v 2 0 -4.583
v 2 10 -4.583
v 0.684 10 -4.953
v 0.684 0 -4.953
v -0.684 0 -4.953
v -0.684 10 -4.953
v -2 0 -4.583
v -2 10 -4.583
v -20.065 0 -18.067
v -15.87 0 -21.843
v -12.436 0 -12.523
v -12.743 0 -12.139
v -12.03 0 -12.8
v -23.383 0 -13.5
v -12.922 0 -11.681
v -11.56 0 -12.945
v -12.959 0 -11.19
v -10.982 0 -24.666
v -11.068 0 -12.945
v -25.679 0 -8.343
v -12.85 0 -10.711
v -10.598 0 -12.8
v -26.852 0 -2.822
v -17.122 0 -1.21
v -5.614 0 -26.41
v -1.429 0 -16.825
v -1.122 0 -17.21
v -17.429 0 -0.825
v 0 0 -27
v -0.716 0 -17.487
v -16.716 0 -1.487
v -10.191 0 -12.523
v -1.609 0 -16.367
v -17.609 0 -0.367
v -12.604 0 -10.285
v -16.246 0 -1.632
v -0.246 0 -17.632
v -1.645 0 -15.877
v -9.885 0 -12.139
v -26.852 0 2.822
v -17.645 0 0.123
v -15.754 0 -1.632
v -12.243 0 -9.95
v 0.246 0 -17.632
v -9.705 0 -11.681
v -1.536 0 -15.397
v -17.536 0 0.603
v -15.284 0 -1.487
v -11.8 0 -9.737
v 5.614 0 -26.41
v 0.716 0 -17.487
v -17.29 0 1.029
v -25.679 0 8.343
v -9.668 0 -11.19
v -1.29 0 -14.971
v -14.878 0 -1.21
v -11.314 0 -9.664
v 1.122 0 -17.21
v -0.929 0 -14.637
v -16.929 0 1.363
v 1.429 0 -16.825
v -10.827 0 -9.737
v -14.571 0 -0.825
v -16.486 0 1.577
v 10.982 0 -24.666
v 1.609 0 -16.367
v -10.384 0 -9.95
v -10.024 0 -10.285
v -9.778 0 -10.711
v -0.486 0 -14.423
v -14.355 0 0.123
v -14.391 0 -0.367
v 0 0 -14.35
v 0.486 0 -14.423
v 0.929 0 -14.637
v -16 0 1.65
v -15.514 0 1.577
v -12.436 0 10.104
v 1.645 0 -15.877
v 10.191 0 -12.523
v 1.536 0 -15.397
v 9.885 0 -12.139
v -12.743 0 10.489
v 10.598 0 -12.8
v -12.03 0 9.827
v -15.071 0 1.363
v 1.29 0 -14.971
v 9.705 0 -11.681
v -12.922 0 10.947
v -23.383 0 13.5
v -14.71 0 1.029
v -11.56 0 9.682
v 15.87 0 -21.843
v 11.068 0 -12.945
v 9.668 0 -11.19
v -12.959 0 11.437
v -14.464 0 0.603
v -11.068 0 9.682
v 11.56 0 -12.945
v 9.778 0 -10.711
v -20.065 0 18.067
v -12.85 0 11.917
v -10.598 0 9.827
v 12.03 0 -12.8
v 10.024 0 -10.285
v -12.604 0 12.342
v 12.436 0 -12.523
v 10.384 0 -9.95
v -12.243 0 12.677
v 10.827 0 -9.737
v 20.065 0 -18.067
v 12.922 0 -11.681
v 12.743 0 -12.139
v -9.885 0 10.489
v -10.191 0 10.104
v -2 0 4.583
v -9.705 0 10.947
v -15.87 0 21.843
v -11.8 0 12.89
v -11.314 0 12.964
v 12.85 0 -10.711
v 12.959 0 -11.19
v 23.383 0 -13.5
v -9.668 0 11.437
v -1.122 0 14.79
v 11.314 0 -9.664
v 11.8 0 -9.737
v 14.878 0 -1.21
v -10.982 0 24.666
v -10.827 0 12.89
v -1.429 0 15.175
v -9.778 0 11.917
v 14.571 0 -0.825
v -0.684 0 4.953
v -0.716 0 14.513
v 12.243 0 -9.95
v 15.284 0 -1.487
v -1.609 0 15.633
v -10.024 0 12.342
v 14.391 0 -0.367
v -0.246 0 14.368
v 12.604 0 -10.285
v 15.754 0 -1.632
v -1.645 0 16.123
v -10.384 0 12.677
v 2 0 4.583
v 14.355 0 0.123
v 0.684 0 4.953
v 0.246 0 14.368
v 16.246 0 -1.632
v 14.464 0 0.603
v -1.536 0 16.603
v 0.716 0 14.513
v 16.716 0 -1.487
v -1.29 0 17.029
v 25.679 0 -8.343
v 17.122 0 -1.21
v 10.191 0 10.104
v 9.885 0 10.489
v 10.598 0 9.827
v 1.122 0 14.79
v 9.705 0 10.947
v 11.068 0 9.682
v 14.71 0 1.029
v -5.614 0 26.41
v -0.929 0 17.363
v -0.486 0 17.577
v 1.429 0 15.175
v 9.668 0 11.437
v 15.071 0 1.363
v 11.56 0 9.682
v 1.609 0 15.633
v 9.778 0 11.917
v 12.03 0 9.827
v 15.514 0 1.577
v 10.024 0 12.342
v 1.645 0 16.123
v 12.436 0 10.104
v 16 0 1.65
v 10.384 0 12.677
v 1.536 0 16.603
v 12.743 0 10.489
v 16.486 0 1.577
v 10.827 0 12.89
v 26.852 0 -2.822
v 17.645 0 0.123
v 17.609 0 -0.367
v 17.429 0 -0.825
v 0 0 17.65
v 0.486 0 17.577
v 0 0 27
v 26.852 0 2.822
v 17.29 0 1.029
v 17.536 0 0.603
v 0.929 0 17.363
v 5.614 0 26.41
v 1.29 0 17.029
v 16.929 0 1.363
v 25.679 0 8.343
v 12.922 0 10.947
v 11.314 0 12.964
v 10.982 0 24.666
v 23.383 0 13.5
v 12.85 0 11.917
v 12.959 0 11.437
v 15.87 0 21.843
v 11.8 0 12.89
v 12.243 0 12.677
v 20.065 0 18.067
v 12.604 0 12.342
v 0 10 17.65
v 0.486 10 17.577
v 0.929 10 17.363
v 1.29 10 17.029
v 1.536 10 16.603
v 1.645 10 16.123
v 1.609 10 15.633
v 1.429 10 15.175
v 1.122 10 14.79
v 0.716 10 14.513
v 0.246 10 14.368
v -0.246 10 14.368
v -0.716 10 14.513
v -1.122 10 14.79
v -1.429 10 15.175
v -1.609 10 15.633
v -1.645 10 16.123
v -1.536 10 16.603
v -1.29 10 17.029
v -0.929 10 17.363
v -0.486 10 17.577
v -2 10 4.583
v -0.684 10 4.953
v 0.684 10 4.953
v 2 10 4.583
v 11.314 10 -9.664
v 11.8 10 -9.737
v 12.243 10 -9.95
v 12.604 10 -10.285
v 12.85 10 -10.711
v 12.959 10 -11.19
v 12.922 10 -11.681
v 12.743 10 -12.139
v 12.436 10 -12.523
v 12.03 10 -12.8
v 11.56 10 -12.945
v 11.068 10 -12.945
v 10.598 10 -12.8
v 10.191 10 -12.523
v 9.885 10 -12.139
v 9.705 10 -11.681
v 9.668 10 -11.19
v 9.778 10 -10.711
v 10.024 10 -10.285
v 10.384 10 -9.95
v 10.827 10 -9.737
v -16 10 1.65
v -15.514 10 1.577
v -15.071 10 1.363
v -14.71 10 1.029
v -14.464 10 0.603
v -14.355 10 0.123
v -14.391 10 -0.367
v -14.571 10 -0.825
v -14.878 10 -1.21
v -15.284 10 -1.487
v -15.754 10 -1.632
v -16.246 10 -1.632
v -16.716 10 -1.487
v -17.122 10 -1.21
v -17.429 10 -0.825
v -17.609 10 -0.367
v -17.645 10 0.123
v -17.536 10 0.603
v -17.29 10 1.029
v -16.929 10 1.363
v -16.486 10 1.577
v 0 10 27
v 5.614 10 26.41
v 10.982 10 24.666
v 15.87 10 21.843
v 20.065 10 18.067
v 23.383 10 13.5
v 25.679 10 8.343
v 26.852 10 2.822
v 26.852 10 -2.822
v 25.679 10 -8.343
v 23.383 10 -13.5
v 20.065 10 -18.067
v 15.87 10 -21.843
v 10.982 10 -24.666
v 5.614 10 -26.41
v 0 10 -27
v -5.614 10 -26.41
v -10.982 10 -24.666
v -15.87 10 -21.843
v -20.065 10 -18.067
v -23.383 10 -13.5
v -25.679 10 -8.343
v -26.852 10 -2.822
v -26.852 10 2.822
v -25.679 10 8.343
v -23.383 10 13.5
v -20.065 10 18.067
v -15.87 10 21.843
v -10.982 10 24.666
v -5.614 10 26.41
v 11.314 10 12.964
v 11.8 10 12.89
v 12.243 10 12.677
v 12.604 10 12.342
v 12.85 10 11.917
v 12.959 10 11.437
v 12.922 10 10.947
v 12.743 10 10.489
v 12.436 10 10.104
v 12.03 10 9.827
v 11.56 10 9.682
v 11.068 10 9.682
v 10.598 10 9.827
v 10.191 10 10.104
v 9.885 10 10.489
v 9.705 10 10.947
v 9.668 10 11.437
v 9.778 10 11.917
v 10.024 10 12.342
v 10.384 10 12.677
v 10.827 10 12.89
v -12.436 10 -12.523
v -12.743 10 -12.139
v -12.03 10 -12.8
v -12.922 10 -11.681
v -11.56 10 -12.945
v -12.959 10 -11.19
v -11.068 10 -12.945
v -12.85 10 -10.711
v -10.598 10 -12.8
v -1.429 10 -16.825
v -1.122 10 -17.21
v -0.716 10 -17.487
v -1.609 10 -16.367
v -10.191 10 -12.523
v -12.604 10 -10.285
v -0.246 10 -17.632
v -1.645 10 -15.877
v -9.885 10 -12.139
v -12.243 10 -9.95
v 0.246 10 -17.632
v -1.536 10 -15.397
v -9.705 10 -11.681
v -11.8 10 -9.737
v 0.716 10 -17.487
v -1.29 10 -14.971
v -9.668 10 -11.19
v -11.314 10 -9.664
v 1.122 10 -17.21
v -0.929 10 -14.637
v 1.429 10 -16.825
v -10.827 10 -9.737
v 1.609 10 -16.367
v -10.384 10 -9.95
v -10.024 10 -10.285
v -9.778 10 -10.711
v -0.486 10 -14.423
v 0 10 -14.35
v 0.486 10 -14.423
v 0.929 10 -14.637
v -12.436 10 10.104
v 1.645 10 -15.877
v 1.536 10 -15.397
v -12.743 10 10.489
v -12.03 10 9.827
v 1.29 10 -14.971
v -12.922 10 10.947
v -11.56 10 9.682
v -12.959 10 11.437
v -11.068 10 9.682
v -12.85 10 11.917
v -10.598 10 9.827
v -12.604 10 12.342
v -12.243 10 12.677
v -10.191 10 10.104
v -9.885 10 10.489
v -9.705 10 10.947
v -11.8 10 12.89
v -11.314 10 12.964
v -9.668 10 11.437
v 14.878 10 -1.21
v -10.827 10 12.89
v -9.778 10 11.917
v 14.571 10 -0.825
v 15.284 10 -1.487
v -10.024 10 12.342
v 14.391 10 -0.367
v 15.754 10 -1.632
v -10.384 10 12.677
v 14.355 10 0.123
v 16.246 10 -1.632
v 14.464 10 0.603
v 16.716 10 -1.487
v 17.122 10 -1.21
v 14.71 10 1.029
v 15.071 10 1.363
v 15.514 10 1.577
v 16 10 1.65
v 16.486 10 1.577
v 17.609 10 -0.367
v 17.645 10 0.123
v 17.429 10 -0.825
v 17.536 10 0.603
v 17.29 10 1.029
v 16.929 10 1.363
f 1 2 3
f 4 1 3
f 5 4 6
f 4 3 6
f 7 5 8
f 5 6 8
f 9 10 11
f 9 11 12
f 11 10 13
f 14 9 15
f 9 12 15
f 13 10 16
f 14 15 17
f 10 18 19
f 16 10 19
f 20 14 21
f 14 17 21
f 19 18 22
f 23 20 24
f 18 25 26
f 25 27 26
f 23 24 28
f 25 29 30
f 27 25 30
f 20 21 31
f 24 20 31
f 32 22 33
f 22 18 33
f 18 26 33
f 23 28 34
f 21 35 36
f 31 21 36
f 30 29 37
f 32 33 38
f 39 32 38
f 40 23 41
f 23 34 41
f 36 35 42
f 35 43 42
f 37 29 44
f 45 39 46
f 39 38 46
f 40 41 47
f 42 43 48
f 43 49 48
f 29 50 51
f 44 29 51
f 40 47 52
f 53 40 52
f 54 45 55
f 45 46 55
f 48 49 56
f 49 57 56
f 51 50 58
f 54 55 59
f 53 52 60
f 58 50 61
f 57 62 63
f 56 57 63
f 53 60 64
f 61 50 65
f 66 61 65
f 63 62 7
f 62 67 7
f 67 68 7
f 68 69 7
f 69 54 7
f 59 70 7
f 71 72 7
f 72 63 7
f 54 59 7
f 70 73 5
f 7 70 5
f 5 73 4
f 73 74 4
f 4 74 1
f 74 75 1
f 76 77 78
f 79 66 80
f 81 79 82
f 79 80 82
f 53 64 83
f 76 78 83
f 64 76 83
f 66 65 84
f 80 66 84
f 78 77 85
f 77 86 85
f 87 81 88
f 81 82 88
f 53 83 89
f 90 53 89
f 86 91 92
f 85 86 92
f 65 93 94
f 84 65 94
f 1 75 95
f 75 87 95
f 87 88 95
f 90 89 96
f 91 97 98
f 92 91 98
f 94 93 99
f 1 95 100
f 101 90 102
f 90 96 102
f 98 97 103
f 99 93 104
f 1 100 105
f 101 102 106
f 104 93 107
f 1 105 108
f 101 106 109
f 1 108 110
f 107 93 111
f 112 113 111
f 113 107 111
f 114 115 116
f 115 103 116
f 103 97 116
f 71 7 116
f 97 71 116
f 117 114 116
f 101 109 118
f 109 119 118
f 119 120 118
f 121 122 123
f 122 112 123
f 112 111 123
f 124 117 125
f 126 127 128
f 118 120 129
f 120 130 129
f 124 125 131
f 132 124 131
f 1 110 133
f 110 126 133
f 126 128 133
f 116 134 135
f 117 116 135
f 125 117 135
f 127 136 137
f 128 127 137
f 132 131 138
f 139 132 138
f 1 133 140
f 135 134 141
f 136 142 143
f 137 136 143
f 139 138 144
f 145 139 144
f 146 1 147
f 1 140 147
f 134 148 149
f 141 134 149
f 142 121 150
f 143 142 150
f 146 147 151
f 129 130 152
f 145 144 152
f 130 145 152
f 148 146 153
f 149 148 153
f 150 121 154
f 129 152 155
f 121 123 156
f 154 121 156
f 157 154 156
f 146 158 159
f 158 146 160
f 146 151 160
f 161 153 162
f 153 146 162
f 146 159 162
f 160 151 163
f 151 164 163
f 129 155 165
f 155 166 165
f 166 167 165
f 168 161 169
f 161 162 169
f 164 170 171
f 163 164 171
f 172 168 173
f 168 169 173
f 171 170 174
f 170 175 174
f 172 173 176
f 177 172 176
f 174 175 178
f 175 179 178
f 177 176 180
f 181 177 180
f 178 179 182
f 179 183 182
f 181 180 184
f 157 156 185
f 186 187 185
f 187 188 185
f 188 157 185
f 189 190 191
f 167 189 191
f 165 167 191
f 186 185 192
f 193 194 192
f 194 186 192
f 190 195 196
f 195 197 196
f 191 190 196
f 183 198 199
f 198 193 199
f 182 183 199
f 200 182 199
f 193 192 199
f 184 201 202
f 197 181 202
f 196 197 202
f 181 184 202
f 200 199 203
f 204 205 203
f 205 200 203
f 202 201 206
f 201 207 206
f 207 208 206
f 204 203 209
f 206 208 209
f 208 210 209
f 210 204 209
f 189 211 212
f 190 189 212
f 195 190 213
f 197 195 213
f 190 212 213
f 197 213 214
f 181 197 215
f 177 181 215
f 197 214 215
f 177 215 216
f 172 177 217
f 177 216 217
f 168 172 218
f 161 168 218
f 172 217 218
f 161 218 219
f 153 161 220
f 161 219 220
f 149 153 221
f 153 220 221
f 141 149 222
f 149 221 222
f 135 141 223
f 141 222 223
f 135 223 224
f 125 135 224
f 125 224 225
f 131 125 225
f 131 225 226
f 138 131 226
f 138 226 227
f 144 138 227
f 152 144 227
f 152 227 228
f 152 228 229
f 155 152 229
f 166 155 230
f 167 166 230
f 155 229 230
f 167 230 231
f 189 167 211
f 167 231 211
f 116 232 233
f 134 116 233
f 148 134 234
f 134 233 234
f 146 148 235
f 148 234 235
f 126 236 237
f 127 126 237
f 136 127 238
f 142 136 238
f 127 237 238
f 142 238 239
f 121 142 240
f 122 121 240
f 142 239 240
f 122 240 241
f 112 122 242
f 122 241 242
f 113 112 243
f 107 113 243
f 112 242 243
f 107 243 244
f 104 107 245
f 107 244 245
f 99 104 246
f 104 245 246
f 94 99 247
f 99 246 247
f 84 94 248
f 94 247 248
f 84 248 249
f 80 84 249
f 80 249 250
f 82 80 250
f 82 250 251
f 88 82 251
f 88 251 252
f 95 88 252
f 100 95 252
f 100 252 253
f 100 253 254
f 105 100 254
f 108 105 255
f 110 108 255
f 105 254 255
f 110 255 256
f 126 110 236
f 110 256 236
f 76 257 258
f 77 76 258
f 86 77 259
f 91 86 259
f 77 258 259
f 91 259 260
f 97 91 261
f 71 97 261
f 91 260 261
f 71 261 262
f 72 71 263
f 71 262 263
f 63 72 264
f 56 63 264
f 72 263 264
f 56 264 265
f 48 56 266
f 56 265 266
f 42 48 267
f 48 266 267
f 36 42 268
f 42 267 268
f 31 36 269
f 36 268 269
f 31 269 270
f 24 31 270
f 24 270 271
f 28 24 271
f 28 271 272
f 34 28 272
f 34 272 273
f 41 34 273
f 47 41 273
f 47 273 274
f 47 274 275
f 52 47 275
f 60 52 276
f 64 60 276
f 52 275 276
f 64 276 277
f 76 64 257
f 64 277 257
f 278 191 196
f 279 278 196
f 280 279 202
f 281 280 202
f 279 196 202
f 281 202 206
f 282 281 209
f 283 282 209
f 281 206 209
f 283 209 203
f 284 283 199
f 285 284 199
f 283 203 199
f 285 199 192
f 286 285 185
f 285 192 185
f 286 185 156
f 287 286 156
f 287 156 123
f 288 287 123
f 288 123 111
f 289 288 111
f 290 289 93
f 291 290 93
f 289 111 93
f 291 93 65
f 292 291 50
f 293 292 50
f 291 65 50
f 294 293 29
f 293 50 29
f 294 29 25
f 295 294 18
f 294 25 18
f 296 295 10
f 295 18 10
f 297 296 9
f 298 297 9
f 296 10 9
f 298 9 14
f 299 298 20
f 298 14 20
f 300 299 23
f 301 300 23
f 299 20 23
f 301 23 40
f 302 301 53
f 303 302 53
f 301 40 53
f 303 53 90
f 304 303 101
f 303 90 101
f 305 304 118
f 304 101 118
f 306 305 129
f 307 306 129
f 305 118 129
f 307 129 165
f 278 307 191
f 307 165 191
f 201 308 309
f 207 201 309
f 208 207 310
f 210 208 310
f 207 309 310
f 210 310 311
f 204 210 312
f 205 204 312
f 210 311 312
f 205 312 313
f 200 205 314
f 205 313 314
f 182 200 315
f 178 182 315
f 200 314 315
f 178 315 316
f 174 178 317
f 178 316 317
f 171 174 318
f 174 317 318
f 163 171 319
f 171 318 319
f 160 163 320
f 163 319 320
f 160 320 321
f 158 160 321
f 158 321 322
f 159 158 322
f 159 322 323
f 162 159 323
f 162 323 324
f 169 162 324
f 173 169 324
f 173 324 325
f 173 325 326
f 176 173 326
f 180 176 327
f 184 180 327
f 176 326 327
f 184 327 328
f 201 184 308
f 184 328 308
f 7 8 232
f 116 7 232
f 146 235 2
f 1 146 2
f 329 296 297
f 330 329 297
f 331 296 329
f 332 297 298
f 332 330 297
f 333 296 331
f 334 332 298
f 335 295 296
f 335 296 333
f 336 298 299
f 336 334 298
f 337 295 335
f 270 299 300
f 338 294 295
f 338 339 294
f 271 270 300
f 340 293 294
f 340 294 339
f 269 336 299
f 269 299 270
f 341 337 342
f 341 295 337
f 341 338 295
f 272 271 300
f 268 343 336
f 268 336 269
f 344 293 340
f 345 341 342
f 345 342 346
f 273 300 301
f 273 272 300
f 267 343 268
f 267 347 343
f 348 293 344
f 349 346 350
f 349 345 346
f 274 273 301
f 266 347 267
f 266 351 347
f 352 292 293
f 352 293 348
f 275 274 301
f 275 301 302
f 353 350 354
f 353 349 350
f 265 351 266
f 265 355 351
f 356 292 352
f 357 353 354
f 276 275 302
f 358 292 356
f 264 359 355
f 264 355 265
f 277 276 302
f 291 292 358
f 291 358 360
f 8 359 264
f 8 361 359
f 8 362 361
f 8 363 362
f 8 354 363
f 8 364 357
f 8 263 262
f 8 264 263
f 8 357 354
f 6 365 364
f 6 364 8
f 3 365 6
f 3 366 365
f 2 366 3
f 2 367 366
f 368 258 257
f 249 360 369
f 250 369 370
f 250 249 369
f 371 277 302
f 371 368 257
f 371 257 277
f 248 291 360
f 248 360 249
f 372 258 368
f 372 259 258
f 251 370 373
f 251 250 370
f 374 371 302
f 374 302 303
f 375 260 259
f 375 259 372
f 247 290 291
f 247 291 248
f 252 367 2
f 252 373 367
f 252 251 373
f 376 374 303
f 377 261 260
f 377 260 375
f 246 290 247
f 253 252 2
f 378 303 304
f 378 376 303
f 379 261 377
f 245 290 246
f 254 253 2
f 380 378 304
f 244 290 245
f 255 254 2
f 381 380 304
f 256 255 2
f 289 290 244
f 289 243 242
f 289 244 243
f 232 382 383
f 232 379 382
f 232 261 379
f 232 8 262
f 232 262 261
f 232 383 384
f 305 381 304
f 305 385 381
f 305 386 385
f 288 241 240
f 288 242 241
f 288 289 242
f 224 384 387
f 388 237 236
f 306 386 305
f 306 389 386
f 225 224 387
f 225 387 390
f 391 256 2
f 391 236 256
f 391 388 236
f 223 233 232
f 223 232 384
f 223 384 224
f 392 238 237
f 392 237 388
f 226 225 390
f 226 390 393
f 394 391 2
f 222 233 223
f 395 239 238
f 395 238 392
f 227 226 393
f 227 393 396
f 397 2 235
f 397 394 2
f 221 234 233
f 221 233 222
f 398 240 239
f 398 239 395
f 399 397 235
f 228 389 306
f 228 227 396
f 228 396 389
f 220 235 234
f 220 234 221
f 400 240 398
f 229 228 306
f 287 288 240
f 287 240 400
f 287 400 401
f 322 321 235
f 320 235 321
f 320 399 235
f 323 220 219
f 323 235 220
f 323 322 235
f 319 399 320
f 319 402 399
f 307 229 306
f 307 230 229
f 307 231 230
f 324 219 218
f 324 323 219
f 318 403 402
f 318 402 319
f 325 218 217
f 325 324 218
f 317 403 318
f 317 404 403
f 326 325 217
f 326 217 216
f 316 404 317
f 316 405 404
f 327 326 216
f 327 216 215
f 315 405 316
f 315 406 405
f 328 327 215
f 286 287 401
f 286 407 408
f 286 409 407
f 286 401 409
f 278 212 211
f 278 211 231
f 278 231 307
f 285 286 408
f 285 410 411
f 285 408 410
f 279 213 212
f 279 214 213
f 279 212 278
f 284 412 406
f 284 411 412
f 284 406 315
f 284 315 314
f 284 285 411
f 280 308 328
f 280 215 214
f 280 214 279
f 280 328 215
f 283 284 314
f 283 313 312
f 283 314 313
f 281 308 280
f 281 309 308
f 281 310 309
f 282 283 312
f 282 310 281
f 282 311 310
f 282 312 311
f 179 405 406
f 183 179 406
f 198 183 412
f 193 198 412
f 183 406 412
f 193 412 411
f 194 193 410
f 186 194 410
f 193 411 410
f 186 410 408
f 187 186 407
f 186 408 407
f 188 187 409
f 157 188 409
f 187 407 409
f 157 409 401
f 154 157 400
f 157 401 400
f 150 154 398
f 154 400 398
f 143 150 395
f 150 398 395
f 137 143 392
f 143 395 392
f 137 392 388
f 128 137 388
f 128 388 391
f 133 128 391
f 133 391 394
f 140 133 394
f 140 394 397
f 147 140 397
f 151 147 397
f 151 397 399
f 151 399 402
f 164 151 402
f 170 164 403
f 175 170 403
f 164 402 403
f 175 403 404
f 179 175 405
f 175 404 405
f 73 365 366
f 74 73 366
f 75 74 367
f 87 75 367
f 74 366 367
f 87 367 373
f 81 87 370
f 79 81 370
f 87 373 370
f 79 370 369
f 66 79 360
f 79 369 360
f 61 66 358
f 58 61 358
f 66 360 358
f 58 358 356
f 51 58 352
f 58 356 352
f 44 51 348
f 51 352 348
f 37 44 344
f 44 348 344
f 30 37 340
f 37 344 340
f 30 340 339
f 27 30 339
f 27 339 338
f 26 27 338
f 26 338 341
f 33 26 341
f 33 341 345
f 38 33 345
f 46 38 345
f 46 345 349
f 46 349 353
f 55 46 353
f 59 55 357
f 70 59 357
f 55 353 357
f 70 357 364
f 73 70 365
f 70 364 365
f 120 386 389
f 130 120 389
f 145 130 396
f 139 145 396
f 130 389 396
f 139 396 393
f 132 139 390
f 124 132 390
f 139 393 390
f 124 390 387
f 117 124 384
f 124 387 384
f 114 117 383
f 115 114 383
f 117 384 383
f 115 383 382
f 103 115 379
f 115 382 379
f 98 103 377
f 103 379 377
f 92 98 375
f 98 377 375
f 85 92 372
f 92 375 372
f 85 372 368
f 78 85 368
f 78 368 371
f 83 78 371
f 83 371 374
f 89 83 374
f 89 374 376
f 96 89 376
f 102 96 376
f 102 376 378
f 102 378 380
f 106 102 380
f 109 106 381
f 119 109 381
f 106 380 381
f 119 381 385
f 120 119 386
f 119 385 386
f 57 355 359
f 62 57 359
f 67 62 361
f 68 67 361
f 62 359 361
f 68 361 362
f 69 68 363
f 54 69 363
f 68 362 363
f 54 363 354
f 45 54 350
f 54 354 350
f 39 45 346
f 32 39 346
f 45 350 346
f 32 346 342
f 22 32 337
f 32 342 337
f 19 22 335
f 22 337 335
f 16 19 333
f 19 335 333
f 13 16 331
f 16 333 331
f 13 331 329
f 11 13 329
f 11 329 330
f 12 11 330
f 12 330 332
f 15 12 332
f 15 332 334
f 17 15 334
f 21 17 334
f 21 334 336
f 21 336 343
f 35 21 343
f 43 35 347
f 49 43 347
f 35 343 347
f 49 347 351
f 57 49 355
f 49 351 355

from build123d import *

# Parameters (mm, degrees)
SKETCH1_R           = 27
BOSS_EXTRUDE1_DEPTH = 10
CUT_EXTRUDE1_DEPTH  = 10
SKETCH3_R           = 1.65
CUT_EXTRUDE2_DEPTH  = 10


with BuildPart() as part:
    # Sketch1 → Boss-Extrude1 (new body)
    with BuildSketch(Plane(origin=(0, 0, 0), x_dir=(1, 0, 0), z_dir=(0, 1, 0))):
        with Locations(Location((0, 0, 0), (0, 0, 270))):
            Circle(SKETCH1_R)
    extrude(amount=BOSS_EXTRUDE1_DEPTH)

    # Sketch2 → Cut-Extrude1 (cut)
    with BuildSketch(Plane(origin=(0, 10, 0), x_dir=(1, 0, 0), z_dir=(0, 1, 0))):
        with BuildLine():
            Line((-2, 4.582575695), (-2, -4.582575695))
            ThreePointArc((-2, -4.582575695), (0, -5), (2, -4.582575695))
            Line((2, -4.582575695), (2, 4.582575695))
            ThreePointArc((2, 4.582575695), (0, 5), (-2, 4.582575695))
        make_face()
    extrude(amount=-CUT_EXTRUDE1_DEPTH, mode=Mode.SUBTRACT)

    # Sketch3 → Cut-Extrude2 (cut)
    with BuildSketch(Plane(origin=(0, 10, 0), x_dir=(1, 0, 0), z_dir=(0, 1, 0))):
        with Locations(Location((16, 0, 0), (0, 0, 270))):
            Circle(SKETCH3_R)
        with Locations(Location((11.313708499, -11.313708499, 0), (0, 0, 270))):
            Circle(SKETCH3_R)
        with Locations(Location((0, -16, 0), (0, 0, 270))):
            Circle(SKETCH3_R)
        with Locations(Location((-11.313708499, -11.313708499, 0), (0, 0, 270))):
            Circle(SKETCH3_R)
        with Locations(Location((-16, 0, 0), (0, 0, 270))):
            Circle(SKETCH3_R)
        with Locations(Location((-11.313708499, 11.313708499, 0), (0, 0, 270))):
            Circle(SKETCH3_R)
        with Locations(Location((0, 16, 0), (0, 0, 270))):
            Circle(SKETCH3_R)
        with Locations(Location((11.313708499, 11.313708499, 0), (0, 0, 270))):
            Circle(SKETCH3_R)
    extrude(amount=-CUT_EXTRUDE2_DEPTH, mode=Mode.SUBTRACT)


solid = part.part
